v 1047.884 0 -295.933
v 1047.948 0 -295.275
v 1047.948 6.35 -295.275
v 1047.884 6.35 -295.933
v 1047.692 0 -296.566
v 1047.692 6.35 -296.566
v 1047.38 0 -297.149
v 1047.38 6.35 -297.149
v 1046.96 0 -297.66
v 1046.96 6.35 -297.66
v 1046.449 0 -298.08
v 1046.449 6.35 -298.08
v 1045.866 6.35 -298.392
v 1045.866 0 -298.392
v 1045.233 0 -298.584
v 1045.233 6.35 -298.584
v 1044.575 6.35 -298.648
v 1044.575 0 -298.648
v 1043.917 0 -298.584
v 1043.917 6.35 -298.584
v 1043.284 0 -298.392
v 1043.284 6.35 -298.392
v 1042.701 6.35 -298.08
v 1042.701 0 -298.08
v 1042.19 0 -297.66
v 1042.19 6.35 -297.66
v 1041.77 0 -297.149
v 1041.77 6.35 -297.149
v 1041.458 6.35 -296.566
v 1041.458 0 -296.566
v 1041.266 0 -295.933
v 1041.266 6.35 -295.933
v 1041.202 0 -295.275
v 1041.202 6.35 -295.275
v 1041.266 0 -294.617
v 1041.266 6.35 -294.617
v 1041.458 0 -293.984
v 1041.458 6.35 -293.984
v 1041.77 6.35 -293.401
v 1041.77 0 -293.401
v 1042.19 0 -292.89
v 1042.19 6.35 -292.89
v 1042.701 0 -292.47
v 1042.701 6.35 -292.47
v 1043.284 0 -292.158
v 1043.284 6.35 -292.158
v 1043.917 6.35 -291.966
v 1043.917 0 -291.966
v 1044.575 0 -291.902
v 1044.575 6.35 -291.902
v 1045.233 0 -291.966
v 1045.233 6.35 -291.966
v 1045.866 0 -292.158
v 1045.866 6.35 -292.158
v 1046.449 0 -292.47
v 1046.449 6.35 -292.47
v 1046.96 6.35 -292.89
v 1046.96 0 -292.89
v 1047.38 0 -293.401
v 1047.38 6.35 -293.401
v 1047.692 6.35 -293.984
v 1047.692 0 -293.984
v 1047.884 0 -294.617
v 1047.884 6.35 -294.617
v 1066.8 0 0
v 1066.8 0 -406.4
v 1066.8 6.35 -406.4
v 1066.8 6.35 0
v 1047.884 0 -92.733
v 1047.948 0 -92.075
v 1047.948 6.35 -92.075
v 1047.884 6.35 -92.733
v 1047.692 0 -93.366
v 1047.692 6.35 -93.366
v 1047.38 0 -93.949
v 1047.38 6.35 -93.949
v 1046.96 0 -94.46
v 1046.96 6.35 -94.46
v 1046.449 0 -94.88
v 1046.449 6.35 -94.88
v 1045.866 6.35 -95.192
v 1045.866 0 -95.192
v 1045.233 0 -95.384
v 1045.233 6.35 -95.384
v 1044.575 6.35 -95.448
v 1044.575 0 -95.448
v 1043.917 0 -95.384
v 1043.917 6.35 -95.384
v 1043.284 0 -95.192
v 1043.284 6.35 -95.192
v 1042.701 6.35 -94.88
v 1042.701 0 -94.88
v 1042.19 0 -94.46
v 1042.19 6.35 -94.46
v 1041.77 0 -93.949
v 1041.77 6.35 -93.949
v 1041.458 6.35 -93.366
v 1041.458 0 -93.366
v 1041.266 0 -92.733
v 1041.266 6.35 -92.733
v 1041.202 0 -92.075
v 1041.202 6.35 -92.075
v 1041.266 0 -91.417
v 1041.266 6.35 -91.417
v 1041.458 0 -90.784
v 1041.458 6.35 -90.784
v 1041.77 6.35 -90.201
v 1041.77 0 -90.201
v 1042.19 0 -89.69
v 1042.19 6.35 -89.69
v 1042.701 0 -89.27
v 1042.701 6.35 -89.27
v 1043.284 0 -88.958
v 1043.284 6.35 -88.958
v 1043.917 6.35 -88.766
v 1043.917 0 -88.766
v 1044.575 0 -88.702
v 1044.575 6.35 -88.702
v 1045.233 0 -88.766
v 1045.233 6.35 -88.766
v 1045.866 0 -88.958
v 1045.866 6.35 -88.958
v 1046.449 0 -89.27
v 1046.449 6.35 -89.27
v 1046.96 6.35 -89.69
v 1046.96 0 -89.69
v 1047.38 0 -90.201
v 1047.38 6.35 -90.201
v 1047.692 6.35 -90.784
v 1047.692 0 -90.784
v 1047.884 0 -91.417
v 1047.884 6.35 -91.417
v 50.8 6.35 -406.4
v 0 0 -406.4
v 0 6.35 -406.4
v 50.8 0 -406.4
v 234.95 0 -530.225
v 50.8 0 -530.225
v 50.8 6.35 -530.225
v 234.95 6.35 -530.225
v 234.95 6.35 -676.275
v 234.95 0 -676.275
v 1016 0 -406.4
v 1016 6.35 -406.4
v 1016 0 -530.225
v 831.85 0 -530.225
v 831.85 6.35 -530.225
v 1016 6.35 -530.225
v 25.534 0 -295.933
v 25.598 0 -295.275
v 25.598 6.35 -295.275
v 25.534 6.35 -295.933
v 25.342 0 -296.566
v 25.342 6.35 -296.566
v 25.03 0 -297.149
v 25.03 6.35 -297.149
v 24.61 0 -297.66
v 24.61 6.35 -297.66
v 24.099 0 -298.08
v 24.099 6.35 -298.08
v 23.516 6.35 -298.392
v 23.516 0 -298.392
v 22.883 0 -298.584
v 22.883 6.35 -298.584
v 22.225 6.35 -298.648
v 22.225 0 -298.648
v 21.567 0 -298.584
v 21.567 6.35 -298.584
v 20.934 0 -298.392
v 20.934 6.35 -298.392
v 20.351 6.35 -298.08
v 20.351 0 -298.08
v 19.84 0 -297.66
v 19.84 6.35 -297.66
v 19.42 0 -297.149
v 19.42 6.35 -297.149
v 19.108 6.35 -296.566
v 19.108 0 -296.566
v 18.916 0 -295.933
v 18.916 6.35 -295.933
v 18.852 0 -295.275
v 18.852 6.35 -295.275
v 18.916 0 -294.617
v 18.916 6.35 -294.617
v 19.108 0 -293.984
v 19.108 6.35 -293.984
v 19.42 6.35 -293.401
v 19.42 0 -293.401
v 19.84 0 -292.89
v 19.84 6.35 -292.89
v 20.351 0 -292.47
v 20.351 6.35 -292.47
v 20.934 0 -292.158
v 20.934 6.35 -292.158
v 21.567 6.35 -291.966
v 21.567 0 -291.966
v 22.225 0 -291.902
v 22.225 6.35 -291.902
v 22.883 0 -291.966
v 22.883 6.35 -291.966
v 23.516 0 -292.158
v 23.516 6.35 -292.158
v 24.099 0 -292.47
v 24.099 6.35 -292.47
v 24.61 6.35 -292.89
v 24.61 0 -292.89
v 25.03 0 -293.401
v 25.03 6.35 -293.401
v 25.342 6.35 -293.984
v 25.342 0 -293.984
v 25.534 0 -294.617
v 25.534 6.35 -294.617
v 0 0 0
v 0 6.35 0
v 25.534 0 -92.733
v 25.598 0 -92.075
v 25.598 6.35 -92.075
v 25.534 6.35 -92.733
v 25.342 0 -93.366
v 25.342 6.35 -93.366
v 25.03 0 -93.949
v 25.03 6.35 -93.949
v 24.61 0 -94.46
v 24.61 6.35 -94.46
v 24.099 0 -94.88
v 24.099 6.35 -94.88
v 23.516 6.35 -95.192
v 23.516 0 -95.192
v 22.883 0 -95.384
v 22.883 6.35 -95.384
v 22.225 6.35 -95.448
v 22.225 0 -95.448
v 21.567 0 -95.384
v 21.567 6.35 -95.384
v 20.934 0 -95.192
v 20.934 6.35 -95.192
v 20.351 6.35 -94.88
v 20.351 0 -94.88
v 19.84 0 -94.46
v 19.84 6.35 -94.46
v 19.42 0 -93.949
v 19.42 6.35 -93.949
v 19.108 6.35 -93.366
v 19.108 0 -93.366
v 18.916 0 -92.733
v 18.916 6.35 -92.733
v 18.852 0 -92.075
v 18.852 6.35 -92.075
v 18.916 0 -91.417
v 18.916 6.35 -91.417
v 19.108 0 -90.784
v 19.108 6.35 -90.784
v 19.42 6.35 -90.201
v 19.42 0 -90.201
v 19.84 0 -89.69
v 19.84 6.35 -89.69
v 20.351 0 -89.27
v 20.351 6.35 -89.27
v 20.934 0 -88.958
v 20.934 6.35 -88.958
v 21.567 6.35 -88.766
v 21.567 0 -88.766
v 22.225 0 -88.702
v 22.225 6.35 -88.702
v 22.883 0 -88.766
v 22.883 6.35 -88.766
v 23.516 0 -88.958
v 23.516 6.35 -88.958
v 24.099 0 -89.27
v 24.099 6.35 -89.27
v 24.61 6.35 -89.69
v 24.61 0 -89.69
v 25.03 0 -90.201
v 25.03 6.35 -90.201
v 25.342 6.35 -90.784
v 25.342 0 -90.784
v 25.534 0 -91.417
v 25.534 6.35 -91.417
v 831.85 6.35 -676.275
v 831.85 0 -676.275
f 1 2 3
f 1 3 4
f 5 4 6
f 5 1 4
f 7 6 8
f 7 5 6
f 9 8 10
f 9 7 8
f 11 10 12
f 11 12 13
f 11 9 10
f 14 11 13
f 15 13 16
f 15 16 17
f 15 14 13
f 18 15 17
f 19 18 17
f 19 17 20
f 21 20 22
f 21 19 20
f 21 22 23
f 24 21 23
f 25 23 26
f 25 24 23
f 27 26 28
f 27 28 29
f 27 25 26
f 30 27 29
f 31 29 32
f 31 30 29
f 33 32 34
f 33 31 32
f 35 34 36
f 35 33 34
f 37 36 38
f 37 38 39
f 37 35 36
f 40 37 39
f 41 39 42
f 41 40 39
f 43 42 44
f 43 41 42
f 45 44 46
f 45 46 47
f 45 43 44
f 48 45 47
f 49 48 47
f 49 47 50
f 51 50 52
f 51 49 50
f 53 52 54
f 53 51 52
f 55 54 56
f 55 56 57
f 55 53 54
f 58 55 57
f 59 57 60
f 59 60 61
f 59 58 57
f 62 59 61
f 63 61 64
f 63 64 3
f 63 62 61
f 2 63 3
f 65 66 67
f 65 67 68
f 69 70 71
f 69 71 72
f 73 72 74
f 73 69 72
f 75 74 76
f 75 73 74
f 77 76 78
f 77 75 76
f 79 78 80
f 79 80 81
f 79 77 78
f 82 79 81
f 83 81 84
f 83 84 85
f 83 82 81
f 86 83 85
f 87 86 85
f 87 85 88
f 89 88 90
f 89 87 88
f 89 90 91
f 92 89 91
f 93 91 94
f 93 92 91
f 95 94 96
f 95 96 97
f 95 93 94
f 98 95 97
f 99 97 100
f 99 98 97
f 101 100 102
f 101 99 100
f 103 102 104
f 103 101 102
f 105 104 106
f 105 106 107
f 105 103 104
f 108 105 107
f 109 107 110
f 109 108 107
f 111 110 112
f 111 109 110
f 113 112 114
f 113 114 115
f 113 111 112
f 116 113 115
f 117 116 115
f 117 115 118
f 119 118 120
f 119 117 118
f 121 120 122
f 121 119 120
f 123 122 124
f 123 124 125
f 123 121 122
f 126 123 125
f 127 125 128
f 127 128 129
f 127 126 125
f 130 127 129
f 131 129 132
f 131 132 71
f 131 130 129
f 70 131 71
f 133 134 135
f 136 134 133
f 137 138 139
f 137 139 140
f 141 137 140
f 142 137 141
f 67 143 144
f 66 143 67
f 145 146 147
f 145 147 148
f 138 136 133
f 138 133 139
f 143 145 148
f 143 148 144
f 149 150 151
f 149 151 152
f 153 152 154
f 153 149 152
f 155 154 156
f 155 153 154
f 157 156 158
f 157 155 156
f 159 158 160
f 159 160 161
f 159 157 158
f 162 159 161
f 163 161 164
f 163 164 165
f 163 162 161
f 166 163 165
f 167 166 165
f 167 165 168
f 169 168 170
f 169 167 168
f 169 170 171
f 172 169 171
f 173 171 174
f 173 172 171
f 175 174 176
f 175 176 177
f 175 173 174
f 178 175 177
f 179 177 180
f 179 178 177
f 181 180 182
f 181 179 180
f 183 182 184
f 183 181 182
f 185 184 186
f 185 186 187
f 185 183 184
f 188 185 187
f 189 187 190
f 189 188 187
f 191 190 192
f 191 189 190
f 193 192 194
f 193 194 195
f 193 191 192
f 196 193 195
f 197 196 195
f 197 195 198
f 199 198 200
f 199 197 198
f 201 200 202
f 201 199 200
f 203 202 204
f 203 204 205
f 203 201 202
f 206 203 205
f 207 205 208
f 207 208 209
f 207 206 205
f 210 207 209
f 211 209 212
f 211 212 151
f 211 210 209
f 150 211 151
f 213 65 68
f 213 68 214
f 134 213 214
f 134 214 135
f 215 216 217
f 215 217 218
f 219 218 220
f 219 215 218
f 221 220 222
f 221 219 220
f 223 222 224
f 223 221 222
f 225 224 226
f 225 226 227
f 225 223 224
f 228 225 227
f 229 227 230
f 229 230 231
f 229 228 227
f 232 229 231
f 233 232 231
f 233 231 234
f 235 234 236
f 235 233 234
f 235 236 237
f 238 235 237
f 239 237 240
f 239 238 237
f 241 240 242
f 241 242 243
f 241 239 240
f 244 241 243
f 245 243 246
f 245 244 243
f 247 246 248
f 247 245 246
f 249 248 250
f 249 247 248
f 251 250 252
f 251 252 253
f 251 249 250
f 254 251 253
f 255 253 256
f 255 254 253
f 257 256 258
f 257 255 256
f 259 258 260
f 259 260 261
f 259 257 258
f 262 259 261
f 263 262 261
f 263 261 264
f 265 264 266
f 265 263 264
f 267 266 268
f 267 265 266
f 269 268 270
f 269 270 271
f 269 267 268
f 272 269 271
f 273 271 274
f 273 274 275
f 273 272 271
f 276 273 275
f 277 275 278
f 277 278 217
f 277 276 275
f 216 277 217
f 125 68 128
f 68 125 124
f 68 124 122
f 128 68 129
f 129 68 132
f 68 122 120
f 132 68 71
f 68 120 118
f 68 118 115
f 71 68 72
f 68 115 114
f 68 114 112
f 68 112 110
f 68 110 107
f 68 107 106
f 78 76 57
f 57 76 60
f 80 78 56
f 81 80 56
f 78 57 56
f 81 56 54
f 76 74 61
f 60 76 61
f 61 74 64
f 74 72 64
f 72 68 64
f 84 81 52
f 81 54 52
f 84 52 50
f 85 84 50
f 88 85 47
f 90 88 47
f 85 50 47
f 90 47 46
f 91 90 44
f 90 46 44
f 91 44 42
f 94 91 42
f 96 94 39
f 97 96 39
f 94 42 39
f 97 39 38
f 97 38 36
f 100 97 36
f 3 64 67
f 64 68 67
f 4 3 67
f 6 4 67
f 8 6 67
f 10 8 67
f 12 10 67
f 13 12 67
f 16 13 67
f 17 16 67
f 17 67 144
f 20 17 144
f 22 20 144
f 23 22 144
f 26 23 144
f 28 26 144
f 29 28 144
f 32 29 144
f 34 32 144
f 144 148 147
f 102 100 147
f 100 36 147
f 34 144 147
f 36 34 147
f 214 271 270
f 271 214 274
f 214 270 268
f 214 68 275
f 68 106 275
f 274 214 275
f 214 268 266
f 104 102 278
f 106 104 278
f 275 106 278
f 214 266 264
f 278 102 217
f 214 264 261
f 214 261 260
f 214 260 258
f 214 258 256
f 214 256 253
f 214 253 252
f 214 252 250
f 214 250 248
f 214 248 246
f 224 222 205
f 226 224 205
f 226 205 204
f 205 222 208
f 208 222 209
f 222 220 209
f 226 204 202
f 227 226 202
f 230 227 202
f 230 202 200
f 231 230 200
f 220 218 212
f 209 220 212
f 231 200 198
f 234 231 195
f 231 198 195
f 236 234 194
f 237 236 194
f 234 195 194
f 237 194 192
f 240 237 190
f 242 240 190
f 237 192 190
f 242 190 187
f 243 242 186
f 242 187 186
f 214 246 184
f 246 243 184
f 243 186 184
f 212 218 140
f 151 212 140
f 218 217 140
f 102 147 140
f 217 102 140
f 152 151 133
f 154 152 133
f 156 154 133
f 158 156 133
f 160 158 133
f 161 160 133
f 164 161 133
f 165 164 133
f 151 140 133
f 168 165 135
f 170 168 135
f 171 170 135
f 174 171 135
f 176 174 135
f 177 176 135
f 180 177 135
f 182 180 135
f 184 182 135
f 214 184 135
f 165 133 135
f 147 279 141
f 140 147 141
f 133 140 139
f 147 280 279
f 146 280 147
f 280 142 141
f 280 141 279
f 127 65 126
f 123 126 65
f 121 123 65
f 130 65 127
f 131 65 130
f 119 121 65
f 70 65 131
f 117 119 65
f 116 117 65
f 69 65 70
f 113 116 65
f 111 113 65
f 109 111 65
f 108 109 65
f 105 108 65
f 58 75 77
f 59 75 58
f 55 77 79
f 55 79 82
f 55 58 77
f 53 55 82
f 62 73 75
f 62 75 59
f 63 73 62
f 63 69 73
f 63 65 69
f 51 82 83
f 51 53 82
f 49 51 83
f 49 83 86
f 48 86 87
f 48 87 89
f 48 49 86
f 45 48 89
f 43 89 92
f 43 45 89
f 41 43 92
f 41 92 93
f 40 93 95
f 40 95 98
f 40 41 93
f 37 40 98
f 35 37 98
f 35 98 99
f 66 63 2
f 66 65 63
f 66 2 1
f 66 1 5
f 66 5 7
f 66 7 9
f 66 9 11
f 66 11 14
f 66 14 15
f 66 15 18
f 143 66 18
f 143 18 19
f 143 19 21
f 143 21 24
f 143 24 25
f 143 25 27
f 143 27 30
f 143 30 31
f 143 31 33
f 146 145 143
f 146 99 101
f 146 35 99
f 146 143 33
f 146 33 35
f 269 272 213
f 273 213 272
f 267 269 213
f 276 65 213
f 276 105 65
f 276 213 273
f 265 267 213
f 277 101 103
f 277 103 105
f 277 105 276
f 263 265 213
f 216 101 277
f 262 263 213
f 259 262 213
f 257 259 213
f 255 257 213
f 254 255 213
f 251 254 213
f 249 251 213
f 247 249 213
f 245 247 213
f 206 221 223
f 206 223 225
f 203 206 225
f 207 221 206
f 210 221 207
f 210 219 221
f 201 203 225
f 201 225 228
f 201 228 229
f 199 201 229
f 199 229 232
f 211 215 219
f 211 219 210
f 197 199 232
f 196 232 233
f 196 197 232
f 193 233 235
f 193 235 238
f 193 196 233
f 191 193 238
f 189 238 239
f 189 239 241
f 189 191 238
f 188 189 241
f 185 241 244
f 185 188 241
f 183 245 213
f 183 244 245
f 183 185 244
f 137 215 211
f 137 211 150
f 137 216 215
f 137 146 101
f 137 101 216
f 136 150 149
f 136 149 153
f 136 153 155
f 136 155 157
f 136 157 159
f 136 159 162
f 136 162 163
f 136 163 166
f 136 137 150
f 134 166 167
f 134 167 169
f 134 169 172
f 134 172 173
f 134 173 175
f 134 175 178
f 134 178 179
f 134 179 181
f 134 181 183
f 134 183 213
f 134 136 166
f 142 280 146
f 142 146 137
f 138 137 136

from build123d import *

# Parameters (mm, degrees)
SKETCH1_R           = 3.3734375
BOSS_EXTRUDE1_DEPTH = 6.35


with BuildPart() as part:
    # Sketch1 → Boss-Extrude1 (new body)
    with BuildSketch(Plane(origin=(0, 0, 0), x_dir=(1, 0, 0), z_dir=(0, 1, 0))):
        Polygon((1016, 406.4), (1066.8, 406.4), (1066.8, 0), (0, 0), (0, 406.4), (50.8, 406.4), (50.8, 530.225), (234.95, 530.225), (234.95, 676.275), (831.85, 676.275), (831.85, 530.225), (1016, 530.225), align=None)
        with Locations((22.225, 92.075)):
            Circle(SKETCH1_R, mode=Mode.SUBTRACT)
        with Locations((1044.575, 92.075)):
            Circle(SKETCH1_R, mode=Mode.SUBTRACT)
        with Locations((22.225, 295.275)):
            Circle(SKETCH1_R, mode=Mode.SUBTRACT)
        with Locations((1044.575, 295.275)):
            Circle(SKETCH1_R, mode=Mode.SUBTRACT)
    extrude(amount=BOSS_EXTRUDE1_DEPTH)


solid = part.part
